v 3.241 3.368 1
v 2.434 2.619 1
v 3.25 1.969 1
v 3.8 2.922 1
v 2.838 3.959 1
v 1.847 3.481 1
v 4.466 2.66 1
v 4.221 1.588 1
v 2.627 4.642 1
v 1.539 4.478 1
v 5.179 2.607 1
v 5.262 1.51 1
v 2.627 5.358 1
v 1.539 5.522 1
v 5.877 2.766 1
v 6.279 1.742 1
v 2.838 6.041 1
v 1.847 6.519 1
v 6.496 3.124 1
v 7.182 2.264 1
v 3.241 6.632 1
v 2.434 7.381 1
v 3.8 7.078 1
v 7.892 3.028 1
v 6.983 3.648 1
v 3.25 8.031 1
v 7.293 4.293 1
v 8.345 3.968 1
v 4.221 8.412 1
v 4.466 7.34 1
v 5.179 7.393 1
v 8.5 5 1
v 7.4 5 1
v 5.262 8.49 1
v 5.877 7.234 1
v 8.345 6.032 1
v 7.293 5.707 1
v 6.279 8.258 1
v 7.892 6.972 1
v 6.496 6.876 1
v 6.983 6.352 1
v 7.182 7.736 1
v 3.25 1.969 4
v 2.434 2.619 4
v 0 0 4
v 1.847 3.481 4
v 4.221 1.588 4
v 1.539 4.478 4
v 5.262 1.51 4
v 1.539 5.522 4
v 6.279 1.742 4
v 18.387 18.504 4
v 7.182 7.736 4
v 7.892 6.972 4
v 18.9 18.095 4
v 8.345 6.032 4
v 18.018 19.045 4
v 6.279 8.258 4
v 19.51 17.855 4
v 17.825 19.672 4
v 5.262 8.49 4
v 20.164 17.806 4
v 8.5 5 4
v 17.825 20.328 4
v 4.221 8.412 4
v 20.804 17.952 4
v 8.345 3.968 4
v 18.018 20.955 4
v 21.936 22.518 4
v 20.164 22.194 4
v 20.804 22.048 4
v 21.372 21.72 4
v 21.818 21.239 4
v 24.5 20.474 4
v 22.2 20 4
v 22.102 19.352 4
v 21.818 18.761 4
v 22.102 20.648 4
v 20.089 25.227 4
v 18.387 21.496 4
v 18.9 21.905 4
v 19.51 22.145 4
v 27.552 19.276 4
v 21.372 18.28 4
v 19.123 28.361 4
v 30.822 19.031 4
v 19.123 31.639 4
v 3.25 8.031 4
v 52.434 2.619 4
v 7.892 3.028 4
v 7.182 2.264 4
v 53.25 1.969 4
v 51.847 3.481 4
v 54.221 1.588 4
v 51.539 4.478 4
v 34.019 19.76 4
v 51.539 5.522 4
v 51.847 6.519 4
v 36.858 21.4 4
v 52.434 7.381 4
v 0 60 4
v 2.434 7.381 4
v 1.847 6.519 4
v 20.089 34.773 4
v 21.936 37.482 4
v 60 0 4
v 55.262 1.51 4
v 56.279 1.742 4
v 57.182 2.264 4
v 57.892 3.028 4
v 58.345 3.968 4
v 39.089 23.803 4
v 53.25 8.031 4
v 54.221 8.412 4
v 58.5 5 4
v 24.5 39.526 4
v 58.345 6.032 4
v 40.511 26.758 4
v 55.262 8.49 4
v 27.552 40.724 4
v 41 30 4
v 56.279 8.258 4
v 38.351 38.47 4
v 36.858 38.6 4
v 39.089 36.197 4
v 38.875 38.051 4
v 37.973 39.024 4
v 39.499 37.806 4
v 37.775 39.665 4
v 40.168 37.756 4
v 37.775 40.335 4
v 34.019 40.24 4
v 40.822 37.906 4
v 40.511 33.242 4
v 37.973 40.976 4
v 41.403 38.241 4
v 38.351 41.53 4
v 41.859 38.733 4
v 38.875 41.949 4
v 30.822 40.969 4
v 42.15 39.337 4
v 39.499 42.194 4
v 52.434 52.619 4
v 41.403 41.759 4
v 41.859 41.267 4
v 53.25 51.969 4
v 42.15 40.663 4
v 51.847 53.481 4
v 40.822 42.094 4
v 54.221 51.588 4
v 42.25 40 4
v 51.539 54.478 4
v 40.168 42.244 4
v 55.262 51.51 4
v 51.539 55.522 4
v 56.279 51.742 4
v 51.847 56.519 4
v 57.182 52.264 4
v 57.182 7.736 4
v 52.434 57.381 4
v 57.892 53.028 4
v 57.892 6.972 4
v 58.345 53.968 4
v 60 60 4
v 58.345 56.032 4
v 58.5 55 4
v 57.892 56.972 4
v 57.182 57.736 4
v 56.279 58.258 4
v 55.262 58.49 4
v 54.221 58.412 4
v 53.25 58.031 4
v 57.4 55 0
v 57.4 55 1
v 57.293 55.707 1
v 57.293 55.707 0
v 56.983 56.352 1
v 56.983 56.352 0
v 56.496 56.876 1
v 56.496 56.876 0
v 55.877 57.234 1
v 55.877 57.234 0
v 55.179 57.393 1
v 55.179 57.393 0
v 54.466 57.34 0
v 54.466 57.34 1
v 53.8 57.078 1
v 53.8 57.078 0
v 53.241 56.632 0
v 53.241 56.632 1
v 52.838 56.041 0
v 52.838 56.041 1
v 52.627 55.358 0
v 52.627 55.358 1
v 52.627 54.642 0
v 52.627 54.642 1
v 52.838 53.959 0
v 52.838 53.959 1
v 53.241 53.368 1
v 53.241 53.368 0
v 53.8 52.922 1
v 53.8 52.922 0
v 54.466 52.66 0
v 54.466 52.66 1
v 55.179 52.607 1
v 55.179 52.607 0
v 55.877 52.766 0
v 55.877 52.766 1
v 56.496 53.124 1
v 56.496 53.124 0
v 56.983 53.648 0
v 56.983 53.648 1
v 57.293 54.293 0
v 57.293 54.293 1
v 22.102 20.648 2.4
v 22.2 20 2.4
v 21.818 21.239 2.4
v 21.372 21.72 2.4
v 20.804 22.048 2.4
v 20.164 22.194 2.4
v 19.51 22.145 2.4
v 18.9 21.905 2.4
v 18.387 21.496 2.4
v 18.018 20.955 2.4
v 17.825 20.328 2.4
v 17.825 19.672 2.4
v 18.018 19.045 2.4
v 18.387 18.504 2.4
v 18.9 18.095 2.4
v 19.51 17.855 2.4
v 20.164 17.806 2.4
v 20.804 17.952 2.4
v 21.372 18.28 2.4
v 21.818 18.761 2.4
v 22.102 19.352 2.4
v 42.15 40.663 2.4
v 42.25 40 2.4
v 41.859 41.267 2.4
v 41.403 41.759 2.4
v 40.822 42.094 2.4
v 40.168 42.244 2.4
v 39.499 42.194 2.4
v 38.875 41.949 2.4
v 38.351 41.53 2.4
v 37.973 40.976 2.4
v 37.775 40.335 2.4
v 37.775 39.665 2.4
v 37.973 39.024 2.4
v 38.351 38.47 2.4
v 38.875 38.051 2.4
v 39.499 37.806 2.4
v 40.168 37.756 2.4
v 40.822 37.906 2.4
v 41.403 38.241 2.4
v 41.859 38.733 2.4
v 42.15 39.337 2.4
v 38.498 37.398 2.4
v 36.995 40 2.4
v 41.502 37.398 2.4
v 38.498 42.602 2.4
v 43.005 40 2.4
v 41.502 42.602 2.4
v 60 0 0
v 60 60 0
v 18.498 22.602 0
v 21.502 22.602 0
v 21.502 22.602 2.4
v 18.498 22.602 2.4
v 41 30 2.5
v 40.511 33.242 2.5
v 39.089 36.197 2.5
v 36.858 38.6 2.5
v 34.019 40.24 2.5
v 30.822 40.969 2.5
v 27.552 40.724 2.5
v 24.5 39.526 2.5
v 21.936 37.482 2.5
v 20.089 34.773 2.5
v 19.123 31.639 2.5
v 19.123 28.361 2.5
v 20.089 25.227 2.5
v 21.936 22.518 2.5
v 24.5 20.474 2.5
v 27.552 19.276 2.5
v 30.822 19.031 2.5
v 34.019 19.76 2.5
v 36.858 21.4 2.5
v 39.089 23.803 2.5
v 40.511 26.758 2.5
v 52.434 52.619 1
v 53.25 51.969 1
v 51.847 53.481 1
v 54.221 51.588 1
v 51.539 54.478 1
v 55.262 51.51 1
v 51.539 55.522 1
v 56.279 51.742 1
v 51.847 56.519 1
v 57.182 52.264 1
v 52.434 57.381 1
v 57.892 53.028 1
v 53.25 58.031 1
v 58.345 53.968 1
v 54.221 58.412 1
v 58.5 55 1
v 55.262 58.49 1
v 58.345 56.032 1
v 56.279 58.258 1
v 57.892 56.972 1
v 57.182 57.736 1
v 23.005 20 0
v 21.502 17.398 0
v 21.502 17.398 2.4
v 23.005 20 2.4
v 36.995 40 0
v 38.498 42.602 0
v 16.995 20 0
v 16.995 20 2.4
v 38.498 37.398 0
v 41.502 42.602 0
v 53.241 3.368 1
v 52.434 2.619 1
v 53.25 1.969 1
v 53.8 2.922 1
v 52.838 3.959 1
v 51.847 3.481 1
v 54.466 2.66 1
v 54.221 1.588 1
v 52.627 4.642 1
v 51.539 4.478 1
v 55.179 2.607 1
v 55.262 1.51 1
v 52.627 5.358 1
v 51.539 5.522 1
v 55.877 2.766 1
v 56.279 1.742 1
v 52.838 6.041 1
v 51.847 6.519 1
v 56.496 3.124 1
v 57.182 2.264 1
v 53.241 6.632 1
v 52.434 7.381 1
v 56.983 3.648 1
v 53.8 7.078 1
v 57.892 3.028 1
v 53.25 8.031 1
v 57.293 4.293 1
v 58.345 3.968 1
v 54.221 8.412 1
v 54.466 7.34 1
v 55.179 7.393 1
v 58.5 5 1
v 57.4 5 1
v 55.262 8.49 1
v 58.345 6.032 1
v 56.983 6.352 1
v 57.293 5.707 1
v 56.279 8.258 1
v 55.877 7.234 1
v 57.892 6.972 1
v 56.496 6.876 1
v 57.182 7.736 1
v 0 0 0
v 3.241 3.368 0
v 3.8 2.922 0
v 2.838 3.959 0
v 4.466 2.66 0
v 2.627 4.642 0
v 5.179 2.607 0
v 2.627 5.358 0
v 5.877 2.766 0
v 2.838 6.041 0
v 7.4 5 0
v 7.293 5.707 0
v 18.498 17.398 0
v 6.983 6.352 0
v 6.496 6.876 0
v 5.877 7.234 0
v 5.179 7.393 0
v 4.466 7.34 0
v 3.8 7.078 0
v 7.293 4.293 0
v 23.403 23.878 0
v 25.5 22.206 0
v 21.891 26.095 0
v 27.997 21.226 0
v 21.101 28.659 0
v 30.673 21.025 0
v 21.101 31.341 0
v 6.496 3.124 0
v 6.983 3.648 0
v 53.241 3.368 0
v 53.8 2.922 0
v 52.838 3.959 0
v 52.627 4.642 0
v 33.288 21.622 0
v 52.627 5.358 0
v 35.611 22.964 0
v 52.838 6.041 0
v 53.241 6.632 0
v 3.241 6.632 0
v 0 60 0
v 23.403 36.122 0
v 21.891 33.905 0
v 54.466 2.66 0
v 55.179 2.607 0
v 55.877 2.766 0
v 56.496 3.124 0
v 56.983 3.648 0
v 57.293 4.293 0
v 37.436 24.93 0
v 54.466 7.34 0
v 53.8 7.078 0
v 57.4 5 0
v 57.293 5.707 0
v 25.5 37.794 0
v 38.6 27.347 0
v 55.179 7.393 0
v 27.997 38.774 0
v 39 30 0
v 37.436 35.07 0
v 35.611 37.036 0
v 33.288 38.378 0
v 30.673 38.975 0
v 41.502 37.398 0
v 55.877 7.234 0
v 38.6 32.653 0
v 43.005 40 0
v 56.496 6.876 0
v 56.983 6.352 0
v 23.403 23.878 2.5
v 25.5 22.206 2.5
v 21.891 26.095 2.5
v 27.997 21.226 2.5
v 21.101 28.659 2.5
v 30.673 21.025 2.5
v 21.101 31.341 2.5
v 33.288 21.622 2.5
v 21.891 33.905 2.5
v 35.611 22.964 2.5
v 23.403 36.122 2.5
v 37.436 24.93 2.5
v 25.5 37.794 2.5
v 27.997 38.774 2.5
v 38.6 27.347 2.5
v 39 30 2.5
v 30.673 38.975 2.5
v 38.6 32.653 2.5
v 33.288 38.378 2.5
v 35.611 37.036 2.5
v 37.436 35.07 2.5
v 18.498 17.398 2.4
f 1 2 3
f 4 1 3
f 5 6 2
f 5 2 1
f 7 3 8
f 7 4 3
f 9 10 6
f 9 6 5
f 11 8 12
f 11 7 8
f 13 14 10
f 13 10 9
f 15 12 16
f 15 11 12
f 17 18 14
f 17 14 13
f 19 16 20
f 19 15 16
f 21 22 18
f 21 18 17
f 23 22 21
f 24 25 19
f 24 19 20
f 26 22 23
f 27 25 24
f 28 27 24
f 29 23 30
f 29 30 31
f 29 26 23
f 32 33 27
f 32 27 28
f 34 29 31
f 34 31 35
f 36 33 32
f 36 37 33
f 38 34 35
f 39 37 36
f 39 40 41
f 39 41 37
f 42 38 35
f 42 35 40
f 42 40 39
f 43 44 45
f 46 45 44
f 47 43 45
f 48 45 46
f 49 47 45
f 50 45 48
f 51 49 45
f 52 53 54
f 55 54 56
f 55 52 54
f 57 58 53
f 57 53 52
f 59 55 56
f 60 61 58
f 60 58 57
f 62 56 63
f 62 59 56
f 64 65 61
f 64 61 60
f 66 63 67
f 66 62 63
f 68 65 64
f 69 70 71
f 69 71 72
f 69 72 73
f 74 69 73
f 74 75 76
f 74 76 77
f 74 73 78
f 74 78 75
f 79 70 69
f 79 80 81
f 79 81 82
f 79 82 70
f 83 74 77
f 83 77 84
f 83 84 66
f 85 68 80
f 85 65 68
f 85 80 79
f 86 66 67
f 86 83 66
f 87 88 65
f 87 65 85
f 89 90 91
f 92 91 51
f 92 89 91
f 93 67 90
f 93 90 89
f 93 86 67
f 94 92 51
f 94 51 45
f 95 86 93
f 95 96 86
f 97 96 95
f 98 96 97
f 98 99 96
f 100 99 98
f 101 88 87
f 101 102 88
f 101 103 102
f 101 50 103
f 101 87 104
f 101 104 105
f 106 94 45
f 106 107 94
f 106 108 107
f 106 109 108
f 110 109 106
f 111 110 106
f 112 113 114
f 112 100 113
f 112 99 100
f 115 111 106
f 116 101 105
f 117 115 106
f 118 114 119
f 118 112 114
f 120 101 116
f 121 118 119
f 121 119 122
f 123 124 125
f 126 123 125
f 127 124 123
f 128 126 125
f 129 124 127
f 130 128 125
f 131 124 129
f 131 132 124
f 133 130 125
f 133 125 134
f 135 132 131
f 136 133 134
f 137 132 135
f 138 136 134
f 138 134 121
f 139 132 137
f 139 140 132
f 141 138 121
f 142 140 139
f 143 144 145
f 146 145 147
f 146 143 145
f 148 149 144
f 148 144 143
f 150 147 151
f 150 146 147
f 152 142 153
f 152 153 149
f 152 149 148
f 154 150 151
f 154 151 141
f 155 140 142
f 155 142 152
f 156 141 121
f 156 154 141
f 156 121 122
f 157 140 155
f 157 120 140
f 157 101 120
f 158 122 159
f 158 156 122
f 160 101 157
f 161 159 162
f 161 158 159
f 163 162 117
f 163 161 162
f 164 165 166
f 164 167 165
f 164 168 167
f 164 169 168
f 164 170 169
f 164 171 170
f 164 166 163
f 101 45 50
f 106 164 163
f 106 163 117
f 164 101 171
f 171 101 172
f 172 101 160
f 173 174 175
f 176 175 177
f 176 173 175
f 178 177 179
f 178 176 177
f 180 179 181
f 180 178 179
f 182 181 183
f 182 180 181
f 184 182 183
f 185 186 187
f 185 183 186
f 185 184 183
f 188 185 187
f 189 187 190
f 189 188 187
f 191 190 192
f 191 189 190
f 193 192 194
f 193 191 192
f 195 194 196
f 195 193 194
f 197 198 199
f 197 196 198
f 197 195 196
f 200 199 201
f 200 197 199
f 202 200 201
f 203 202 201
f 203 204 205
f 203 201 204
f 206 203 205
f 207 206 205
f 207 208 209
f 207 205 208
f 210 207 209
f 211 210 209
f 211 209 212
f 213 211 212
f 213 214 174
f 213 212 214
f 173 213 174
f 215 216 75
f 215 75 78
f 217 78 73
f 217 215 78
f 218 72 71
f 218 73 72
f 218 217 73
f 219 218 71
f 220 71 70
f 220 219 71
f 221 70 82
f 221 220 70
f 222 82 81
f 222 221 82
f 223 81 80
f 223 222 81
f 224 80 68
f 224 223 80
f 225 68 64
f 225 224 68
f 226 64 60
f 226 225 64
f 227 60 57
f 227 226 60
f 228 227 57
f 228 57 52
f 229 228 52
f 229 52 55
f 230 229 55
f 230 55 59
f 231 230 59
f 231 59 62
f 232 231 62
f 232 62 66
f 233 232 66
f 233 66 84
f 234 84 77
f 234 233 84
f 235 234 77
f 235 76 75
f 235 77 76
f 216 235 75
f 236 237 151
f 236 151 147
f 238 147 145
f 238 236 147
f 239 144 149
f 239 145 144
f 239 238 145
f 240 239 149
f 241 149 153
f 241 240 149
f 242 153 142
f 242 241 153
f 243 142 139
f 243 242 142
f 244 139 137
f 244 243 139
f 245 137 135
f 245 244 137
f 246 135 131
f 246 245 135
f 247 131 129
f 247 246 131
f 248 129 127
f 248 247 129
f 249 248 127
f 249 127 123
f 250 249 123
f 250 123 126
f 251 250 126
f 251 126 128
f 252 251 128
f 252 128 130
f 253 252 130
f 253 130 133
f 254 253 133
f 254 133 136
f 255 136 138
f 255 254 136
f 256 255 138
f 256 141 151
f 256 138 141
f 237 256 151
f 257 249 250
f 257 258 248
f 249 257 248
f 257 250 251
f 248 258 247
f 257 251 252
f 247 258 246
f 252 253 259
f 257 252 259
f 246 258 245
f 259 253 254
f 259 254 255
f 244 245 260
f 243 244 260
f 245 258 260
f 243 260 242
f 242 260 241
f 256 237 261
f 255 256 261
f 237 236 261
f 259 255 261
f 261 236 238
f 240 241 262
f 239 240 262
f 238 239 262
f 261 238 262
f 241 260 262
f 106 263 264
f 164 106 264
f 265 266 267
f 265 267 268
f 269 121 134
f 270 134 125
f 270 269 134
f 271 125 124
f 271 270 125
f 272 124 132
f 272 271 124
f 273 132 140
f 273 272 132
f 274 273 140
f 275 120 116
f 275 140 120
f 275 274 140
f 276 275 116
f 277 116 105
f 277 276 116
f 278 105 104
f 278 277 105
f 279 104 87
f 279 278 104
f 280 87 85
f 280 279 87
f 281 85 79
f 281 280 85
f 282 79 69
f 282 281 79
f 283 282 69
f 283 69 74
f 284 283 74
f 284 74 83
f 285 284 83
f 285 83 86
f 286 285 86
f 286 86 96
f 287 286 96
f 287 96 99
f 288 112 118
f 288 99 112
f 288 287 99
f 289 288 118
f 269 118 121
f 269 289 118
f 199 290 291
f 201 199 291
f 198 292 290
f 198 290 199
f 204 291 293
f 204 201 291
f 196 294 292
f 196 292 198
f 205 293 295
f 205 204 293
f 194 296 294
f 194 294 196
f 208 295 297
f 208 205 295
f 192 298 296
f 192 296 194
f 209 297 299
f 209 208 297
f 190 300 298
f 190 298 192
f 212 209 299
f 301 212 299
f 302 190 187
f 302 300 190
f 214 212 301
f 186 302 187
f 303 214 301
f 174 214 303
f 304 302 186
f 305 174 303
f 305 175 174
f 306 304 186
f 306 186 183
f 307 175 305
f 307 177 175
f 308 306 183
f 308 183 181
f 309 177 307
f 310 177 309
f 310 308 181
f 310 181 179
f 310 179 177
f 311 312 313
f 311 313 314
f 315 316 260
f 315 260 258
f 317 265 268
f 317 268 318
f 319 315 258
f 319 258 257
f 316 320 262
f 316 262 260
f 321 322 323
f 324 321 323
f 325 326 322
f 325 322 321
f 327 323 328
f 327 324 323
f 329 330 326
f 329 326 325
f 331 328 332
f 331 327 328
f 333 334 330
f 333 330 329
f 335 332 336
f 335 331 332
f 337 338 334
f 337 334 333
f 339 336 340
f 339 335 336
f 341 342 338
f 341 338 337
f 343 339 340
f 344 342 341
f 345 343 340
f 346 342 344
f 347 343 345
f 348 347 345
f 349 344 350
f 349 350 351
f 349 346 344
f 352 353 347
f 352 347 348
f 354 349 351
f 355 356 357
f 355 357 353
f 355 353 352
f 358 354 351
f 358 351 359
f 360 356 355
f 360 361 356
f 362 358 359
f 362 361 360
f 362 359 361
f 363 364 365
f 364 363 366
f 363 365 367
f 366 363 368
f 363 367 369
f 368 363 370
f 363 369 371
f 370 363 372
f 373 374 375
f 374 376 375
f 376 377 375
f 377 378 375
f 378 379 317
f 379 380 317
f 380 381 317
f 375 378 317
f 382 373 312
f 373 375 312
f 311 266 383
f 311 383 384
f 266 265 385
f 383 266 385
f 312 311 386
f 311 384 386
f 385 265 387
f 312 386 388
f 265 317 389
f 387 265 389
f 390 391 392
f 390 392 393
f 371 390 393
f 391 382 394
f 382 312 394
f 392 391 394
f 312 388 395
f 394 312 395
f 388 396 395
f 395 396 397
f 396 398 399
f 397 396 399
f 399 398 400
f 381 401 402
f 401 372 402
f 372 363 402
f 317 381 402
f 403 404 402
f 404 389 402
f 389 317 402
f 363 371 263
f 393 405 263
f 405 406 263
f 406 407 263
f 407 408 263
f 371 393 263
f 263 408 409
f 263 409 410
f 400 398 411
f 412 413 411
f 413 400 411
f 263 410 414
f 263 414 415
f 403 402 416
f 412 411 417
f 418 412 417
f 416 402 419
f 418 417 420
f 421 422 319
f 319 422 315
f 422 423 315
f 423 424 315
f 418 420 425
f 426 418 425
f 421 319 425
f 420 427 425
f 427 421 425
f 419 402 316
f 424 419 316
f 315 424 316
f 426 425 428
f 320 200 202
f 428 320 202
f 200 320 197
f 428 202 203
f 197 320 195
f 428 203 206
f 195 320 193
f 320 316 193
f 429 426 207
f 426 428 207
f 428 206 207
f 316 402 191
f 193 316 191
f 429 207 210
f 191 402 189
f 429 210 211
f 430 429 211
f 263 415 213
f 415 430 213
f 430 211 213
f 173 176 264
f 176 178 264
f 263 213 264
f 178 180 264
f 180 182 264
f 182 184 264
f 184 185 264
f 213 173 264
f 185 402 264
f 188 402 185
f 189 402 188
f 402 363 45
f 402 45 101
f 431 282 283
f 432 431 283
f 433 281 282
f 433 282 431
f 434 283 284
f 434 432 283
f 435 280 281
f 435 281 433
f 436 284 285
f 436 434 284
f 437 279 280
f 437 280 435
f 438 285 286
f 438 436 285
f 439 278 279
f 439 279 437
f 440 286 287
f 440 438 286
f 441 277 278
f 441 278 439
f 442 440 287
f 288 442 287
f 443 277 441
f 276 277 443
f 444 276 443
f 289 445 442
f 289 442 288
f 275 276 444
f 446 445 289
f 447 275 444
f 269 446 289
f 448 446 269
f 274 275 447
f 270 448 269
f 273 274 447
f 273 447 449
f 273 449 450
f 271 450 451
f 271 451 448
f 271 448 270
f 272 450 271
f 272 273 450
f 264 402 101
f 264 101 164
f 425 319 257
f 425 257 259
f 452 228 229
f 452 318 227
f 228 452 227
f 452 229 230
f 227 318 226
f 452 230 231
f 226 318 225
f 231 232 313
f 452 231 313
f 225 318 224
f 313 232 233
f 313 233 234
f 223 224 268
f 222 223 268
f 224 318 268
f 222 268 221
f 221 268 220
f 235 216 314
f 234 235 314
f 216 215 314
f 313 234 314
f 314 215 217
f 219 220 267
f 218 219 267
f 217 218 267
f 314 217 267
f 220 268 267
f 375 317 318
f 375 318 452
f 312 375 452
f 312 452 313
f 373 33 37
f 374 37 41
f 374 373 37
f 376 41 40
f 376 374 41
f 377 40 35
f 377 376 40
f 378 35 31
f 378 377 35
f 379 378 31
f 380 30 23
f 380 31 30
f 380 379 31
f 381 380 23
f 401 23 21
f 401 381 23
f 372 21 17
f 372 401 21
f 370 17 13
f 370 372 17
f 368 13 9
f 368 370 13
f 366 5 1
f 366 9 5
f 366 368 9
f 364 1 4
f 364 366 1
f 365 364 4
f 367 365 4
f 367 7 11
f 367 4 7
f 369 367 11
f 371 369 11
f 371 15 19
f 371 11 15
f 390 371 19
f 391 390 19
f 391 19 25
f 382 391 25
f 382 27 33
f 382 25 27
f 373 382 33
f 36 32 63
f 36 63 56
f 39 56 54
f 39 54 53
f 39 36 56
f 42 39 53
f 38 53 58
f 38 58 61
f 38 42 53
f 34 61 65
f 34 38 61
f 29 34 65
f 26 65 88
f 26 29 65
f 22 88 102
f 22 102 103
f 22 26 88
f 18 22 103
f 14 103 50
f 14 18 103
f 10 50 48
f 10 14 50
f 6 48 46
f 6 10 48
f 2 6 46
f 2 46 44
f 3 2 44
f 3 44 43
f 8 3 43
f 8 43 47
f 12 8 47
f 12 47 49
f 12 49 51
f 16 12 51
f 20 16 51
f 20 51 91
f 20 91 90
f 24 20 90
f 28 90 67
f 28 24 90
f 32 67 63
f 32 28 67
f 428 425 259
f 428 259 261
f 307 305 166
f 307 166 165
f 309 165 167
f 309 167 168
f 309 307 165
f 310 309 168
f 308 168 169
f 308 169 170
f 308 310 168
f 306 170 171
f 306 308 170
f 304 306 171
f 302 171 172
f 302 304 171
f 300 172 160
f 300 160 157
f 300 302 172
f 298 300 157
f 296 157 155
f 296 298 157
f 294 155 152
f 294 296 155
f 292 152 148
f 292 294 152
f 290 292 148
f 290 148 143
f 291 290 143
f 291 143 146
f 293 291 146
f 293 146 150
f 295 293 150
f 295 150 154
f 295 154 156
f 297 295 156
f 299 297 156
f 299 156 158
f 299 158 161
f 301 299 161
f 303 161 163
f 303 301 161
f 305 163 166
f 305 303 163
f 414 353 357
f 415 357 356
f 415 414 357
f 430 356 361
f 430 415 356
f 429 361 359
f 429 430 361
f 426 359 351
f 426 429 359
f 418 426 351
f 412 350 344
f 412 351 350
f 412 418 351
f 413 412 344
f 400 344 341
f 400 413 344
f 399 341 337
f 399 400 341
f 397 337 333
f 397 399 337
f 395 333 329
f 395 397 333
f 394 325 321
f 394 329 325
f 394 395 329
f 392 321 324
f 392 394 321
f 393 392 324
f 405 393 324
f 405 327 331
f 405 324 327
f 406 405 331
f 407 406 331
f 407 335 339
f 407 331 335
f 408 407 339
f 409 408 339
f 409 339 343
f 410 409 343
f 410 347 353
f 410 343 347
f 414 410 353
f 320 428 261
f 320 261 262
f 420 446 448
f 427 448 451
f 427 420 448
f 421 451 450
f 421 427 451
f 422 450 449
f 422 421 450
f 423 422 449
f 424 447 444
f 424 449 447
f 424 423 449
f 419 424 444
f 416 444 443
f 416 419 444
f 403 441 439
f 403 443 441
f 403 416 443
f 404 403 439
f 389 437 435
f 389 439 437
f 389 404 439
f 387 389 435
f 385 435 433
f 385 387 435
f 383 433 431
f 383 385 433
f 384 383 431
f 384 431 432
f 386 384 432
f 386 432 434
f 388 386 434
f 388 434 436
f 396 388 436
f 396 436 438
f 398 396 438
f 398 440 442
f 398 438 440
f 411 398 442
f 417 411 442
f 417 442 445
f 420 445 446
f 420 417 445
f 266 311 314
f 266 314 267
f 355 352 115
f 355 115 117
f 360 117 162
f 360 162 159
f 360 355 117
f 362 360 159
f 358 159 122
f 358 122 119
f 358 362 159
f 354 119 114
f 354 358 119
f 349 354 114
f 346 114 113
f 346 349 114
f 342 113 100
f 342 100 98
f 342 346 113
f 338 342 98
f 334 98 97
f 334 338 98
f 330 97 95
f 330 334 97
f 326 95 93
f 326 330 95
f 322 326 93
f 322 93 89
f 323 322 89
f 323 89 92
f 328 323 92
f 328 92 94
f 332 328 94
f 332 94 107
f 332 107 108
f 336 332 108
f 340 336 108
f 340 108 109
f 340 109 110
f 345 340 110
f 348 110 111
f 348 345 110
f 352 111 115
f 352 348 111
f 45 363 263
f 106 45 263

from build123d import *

# Parameters (mm, degrees)
CYLINDER031_R     = 2.25
CYLINDER031_DEPTH = 10
EXTRUDE002_DEPTH  = 2.4
CYLINDER030_R     = 2.2
CYLINDER030_DEPTH = 10
EXTRUDE001_DEPTH  = 2.4
CYLINDER029_R     = 11
CYLINDER029_DEPTH = 10
CYLINDER022_R     = 9
CYLINDER022_DEPTH = 10
CYLINDER024_R     = 3.5
CYLINDER024_DEPTH = 3
CYLINDER023_R     = 2.4
CYLINDER023_DEPTH = 10
CYLINDER026_R     = 3.5
CYLINDER026_DEPTH = 3
CYLINDER025_R     = 2.4
CYLINDER025_DEPTH = 10
CYLINDER028_R     = 3.5
CYLINDER028_DEPTH = 3
CYLINDER027_R     = 2.4
CYLINDER027_DEPTH = 10
BOX005_W          = 60
BOX005_H          = 60
BOX005_DEPTH      = 4


with BuildPart() as cylinder031:
    # Cylinder031 → Cylinder031 (new body)
    with BuildSketch(Plane(origin=(40, 40, 0), x_dir=(1, 0, 0), z_dir=(0, 0, 1))):
        Circle(CYLINDER031_R)
    extrude(amount=CYLINDER031_DEPTH)


with BuildPart() as fusion026:
    # Sketch002 → Extrude002 (new body)
    with BuildSketch(Plane.XY):
        Polygon((-3.005, 0), (-1.5025, -2.602406), (1.5025, -2.602406), (3.005, 0), (1.5025, 2.602406), (-1.5025, 2.602406), align=None)
    extrude(amount=EXTRUDE002_DEPTH)


with BuildPart() as fusion026_1:
    # Extrude002 placement: moved
    add(fusion026.part.moved(Location((40, 40, 0))))

    # Fusion026: union Cylinder031
    add(cylinder031.part)


with BuildPart() as cylinder030:
    # Cylinder030 → Cylinder030 (new body)
    with BuildSketch(Plane(origin=(20, 20, 0), x_dir=(1, 0, 0), z_dir=(0, 0, 1))):
        Circle(CYLINDER030_R)
    extrude(amount=CYLINDER030_DEPTH)


with BuildPart() as compound004:
    # Sketch001 → Extrude001 (new body)
    with BuildSketch(Plane.XY):
        Polygon((-3.005, 0), (-1.5025, -2.602406), (1.5025, -2.602406), (3.005, 0), (1.5025, 2.602406), (-1.5025, 2.602406), align=None)
    extrude(amount=EXTRUDE001_DEPTH)


with BuildPart() as compound004_1:
    # Extrude001 placement: moved
    add(compound004.part.moved(Location((20, 20, 0))))

    # Fusion025: union Cylinder030
    add(cylinder030.part)

    # Compound004: union Fusion026
    add(fusion026_1.part)


with BuildPart() as cylinder029:
    # Cylinder029 → Cylinder029 (new body)
    with BuildSketch(Plane(origin=(30, 30, 2.5), x_dir=(1, 0, 0), z_dir=(0, 0, 1))):
        Circle(CYLINDER029_R)
    extrude(amount=CYLINDER029_DEPTH)


with BuildPart() as cylinder022:
    # Cylinder022 → Cylinder022 (new body)
    with BuildSketch(Plane(origin=(30, 30, 0), x_dir=(1, 0, 0), z_dir=(0, 0, 1))):
        Circle(CYLINDER022_R)
    extrude(amount=CYLINDER022_DEPTH)


with BuildPart() as cylinder024:
    # Cylinder024 → Cylinder024 (new body)
    with BuildSketch(Plane.XY.offset(1)):
        Circle(CYLINDER024_R)
    extrude(amount=CYLINDER024_DEPTH)


with BuildPart() as fusion022:
    # Cylinder023 → Cylinder023 (new body)
    with BuildSketch(Plane.XY):
        Circle(CYLINDER023_R)
    extrude(amount=CYLINDER023_DEPTH)

    # Fusion022: union Cylinder024
    add(cylinder024.part)


with BuildPart() as fusion022_1:
    # Fusion022 placement: moved
    add(fusion022.part.moved(Location((5, 5, 0))))


with BuildPart() as cylinder026:
    # Cylinder026 → Cylinder026 (new body)
    with BuildSketch(Plane.XY.offset(1)):
        Circle(CYLINDER026_R)
    extrude(amount=CYLINDER026_DEPTH)


with BuildPart() as fusion023:
    # Cylinder025 → Cylinder025 (new body)
    with BuildSketch(Plane.XY):
        Circle(CYLINDER025_R)
    extrude(amount=CYLINDER025_DEPTH)

    # Fusion023: union Cylinder026
    add(cylinder026.part)


with BuildPart() as fusion023_1:
    # Fusion023 placement: moved
    add(fusion023.part.moved(Location((55, 5, 0))))


with BuildPart() as cylinder028:
    # Cylinder028 → Cylinder028 (new body)
    with BuildSketch(Plane.XY.offset(1)):
        Circle(CYLINDER028_R)
    extrude(amount=CYLINDER028_DEPTH)


with BuildPart() as compound003:
    # Cylinder027 → Cylinder027 (new body)
    with BuildSketch(Plane.XY):
        Circle(CYLINDER027_R)
    extrude(amount=CYLINDER027_DEPTH)

    # Fusion024: union Cylinder028
    add(cylinder028.part)


with BuildPart() as compound003_1:
    # Fusion024 placement: moved
    add(compound003.part.moved(Location((55, 55, 0))))

    # Compound003: union Fusion022, Fusion023
    add(fusion022_1.part)
    add(fusion023_1.part)


with BuildPart() as kinematicmount_holder01_20mm:
    # Box005 → Box005 (new body)
    with BuildSketch(Plane.XY):
        with Locations((30, 30)):
            Rectangle(BOX005_W, BOX005_H)
    extrude(amount=BOX005_DEPTH)

    # Cut007: cut Compound003
    add(compound003_1.part, mode=Mode.SUBTRACT)

    # Cut008: cut Cylinder022
    add(cylinder022.part, mode=Mode.SUBTRACT)

    # Cut009: cut Cylinder029
    add(cylinder029.part, mode=Mode.SUBTRACT)

    # Cut010: cut Compound004
    add(compound004_1.part, mode=Mode.SUBTRACT)


solid = kinematicmount_holder01_20mm.part
